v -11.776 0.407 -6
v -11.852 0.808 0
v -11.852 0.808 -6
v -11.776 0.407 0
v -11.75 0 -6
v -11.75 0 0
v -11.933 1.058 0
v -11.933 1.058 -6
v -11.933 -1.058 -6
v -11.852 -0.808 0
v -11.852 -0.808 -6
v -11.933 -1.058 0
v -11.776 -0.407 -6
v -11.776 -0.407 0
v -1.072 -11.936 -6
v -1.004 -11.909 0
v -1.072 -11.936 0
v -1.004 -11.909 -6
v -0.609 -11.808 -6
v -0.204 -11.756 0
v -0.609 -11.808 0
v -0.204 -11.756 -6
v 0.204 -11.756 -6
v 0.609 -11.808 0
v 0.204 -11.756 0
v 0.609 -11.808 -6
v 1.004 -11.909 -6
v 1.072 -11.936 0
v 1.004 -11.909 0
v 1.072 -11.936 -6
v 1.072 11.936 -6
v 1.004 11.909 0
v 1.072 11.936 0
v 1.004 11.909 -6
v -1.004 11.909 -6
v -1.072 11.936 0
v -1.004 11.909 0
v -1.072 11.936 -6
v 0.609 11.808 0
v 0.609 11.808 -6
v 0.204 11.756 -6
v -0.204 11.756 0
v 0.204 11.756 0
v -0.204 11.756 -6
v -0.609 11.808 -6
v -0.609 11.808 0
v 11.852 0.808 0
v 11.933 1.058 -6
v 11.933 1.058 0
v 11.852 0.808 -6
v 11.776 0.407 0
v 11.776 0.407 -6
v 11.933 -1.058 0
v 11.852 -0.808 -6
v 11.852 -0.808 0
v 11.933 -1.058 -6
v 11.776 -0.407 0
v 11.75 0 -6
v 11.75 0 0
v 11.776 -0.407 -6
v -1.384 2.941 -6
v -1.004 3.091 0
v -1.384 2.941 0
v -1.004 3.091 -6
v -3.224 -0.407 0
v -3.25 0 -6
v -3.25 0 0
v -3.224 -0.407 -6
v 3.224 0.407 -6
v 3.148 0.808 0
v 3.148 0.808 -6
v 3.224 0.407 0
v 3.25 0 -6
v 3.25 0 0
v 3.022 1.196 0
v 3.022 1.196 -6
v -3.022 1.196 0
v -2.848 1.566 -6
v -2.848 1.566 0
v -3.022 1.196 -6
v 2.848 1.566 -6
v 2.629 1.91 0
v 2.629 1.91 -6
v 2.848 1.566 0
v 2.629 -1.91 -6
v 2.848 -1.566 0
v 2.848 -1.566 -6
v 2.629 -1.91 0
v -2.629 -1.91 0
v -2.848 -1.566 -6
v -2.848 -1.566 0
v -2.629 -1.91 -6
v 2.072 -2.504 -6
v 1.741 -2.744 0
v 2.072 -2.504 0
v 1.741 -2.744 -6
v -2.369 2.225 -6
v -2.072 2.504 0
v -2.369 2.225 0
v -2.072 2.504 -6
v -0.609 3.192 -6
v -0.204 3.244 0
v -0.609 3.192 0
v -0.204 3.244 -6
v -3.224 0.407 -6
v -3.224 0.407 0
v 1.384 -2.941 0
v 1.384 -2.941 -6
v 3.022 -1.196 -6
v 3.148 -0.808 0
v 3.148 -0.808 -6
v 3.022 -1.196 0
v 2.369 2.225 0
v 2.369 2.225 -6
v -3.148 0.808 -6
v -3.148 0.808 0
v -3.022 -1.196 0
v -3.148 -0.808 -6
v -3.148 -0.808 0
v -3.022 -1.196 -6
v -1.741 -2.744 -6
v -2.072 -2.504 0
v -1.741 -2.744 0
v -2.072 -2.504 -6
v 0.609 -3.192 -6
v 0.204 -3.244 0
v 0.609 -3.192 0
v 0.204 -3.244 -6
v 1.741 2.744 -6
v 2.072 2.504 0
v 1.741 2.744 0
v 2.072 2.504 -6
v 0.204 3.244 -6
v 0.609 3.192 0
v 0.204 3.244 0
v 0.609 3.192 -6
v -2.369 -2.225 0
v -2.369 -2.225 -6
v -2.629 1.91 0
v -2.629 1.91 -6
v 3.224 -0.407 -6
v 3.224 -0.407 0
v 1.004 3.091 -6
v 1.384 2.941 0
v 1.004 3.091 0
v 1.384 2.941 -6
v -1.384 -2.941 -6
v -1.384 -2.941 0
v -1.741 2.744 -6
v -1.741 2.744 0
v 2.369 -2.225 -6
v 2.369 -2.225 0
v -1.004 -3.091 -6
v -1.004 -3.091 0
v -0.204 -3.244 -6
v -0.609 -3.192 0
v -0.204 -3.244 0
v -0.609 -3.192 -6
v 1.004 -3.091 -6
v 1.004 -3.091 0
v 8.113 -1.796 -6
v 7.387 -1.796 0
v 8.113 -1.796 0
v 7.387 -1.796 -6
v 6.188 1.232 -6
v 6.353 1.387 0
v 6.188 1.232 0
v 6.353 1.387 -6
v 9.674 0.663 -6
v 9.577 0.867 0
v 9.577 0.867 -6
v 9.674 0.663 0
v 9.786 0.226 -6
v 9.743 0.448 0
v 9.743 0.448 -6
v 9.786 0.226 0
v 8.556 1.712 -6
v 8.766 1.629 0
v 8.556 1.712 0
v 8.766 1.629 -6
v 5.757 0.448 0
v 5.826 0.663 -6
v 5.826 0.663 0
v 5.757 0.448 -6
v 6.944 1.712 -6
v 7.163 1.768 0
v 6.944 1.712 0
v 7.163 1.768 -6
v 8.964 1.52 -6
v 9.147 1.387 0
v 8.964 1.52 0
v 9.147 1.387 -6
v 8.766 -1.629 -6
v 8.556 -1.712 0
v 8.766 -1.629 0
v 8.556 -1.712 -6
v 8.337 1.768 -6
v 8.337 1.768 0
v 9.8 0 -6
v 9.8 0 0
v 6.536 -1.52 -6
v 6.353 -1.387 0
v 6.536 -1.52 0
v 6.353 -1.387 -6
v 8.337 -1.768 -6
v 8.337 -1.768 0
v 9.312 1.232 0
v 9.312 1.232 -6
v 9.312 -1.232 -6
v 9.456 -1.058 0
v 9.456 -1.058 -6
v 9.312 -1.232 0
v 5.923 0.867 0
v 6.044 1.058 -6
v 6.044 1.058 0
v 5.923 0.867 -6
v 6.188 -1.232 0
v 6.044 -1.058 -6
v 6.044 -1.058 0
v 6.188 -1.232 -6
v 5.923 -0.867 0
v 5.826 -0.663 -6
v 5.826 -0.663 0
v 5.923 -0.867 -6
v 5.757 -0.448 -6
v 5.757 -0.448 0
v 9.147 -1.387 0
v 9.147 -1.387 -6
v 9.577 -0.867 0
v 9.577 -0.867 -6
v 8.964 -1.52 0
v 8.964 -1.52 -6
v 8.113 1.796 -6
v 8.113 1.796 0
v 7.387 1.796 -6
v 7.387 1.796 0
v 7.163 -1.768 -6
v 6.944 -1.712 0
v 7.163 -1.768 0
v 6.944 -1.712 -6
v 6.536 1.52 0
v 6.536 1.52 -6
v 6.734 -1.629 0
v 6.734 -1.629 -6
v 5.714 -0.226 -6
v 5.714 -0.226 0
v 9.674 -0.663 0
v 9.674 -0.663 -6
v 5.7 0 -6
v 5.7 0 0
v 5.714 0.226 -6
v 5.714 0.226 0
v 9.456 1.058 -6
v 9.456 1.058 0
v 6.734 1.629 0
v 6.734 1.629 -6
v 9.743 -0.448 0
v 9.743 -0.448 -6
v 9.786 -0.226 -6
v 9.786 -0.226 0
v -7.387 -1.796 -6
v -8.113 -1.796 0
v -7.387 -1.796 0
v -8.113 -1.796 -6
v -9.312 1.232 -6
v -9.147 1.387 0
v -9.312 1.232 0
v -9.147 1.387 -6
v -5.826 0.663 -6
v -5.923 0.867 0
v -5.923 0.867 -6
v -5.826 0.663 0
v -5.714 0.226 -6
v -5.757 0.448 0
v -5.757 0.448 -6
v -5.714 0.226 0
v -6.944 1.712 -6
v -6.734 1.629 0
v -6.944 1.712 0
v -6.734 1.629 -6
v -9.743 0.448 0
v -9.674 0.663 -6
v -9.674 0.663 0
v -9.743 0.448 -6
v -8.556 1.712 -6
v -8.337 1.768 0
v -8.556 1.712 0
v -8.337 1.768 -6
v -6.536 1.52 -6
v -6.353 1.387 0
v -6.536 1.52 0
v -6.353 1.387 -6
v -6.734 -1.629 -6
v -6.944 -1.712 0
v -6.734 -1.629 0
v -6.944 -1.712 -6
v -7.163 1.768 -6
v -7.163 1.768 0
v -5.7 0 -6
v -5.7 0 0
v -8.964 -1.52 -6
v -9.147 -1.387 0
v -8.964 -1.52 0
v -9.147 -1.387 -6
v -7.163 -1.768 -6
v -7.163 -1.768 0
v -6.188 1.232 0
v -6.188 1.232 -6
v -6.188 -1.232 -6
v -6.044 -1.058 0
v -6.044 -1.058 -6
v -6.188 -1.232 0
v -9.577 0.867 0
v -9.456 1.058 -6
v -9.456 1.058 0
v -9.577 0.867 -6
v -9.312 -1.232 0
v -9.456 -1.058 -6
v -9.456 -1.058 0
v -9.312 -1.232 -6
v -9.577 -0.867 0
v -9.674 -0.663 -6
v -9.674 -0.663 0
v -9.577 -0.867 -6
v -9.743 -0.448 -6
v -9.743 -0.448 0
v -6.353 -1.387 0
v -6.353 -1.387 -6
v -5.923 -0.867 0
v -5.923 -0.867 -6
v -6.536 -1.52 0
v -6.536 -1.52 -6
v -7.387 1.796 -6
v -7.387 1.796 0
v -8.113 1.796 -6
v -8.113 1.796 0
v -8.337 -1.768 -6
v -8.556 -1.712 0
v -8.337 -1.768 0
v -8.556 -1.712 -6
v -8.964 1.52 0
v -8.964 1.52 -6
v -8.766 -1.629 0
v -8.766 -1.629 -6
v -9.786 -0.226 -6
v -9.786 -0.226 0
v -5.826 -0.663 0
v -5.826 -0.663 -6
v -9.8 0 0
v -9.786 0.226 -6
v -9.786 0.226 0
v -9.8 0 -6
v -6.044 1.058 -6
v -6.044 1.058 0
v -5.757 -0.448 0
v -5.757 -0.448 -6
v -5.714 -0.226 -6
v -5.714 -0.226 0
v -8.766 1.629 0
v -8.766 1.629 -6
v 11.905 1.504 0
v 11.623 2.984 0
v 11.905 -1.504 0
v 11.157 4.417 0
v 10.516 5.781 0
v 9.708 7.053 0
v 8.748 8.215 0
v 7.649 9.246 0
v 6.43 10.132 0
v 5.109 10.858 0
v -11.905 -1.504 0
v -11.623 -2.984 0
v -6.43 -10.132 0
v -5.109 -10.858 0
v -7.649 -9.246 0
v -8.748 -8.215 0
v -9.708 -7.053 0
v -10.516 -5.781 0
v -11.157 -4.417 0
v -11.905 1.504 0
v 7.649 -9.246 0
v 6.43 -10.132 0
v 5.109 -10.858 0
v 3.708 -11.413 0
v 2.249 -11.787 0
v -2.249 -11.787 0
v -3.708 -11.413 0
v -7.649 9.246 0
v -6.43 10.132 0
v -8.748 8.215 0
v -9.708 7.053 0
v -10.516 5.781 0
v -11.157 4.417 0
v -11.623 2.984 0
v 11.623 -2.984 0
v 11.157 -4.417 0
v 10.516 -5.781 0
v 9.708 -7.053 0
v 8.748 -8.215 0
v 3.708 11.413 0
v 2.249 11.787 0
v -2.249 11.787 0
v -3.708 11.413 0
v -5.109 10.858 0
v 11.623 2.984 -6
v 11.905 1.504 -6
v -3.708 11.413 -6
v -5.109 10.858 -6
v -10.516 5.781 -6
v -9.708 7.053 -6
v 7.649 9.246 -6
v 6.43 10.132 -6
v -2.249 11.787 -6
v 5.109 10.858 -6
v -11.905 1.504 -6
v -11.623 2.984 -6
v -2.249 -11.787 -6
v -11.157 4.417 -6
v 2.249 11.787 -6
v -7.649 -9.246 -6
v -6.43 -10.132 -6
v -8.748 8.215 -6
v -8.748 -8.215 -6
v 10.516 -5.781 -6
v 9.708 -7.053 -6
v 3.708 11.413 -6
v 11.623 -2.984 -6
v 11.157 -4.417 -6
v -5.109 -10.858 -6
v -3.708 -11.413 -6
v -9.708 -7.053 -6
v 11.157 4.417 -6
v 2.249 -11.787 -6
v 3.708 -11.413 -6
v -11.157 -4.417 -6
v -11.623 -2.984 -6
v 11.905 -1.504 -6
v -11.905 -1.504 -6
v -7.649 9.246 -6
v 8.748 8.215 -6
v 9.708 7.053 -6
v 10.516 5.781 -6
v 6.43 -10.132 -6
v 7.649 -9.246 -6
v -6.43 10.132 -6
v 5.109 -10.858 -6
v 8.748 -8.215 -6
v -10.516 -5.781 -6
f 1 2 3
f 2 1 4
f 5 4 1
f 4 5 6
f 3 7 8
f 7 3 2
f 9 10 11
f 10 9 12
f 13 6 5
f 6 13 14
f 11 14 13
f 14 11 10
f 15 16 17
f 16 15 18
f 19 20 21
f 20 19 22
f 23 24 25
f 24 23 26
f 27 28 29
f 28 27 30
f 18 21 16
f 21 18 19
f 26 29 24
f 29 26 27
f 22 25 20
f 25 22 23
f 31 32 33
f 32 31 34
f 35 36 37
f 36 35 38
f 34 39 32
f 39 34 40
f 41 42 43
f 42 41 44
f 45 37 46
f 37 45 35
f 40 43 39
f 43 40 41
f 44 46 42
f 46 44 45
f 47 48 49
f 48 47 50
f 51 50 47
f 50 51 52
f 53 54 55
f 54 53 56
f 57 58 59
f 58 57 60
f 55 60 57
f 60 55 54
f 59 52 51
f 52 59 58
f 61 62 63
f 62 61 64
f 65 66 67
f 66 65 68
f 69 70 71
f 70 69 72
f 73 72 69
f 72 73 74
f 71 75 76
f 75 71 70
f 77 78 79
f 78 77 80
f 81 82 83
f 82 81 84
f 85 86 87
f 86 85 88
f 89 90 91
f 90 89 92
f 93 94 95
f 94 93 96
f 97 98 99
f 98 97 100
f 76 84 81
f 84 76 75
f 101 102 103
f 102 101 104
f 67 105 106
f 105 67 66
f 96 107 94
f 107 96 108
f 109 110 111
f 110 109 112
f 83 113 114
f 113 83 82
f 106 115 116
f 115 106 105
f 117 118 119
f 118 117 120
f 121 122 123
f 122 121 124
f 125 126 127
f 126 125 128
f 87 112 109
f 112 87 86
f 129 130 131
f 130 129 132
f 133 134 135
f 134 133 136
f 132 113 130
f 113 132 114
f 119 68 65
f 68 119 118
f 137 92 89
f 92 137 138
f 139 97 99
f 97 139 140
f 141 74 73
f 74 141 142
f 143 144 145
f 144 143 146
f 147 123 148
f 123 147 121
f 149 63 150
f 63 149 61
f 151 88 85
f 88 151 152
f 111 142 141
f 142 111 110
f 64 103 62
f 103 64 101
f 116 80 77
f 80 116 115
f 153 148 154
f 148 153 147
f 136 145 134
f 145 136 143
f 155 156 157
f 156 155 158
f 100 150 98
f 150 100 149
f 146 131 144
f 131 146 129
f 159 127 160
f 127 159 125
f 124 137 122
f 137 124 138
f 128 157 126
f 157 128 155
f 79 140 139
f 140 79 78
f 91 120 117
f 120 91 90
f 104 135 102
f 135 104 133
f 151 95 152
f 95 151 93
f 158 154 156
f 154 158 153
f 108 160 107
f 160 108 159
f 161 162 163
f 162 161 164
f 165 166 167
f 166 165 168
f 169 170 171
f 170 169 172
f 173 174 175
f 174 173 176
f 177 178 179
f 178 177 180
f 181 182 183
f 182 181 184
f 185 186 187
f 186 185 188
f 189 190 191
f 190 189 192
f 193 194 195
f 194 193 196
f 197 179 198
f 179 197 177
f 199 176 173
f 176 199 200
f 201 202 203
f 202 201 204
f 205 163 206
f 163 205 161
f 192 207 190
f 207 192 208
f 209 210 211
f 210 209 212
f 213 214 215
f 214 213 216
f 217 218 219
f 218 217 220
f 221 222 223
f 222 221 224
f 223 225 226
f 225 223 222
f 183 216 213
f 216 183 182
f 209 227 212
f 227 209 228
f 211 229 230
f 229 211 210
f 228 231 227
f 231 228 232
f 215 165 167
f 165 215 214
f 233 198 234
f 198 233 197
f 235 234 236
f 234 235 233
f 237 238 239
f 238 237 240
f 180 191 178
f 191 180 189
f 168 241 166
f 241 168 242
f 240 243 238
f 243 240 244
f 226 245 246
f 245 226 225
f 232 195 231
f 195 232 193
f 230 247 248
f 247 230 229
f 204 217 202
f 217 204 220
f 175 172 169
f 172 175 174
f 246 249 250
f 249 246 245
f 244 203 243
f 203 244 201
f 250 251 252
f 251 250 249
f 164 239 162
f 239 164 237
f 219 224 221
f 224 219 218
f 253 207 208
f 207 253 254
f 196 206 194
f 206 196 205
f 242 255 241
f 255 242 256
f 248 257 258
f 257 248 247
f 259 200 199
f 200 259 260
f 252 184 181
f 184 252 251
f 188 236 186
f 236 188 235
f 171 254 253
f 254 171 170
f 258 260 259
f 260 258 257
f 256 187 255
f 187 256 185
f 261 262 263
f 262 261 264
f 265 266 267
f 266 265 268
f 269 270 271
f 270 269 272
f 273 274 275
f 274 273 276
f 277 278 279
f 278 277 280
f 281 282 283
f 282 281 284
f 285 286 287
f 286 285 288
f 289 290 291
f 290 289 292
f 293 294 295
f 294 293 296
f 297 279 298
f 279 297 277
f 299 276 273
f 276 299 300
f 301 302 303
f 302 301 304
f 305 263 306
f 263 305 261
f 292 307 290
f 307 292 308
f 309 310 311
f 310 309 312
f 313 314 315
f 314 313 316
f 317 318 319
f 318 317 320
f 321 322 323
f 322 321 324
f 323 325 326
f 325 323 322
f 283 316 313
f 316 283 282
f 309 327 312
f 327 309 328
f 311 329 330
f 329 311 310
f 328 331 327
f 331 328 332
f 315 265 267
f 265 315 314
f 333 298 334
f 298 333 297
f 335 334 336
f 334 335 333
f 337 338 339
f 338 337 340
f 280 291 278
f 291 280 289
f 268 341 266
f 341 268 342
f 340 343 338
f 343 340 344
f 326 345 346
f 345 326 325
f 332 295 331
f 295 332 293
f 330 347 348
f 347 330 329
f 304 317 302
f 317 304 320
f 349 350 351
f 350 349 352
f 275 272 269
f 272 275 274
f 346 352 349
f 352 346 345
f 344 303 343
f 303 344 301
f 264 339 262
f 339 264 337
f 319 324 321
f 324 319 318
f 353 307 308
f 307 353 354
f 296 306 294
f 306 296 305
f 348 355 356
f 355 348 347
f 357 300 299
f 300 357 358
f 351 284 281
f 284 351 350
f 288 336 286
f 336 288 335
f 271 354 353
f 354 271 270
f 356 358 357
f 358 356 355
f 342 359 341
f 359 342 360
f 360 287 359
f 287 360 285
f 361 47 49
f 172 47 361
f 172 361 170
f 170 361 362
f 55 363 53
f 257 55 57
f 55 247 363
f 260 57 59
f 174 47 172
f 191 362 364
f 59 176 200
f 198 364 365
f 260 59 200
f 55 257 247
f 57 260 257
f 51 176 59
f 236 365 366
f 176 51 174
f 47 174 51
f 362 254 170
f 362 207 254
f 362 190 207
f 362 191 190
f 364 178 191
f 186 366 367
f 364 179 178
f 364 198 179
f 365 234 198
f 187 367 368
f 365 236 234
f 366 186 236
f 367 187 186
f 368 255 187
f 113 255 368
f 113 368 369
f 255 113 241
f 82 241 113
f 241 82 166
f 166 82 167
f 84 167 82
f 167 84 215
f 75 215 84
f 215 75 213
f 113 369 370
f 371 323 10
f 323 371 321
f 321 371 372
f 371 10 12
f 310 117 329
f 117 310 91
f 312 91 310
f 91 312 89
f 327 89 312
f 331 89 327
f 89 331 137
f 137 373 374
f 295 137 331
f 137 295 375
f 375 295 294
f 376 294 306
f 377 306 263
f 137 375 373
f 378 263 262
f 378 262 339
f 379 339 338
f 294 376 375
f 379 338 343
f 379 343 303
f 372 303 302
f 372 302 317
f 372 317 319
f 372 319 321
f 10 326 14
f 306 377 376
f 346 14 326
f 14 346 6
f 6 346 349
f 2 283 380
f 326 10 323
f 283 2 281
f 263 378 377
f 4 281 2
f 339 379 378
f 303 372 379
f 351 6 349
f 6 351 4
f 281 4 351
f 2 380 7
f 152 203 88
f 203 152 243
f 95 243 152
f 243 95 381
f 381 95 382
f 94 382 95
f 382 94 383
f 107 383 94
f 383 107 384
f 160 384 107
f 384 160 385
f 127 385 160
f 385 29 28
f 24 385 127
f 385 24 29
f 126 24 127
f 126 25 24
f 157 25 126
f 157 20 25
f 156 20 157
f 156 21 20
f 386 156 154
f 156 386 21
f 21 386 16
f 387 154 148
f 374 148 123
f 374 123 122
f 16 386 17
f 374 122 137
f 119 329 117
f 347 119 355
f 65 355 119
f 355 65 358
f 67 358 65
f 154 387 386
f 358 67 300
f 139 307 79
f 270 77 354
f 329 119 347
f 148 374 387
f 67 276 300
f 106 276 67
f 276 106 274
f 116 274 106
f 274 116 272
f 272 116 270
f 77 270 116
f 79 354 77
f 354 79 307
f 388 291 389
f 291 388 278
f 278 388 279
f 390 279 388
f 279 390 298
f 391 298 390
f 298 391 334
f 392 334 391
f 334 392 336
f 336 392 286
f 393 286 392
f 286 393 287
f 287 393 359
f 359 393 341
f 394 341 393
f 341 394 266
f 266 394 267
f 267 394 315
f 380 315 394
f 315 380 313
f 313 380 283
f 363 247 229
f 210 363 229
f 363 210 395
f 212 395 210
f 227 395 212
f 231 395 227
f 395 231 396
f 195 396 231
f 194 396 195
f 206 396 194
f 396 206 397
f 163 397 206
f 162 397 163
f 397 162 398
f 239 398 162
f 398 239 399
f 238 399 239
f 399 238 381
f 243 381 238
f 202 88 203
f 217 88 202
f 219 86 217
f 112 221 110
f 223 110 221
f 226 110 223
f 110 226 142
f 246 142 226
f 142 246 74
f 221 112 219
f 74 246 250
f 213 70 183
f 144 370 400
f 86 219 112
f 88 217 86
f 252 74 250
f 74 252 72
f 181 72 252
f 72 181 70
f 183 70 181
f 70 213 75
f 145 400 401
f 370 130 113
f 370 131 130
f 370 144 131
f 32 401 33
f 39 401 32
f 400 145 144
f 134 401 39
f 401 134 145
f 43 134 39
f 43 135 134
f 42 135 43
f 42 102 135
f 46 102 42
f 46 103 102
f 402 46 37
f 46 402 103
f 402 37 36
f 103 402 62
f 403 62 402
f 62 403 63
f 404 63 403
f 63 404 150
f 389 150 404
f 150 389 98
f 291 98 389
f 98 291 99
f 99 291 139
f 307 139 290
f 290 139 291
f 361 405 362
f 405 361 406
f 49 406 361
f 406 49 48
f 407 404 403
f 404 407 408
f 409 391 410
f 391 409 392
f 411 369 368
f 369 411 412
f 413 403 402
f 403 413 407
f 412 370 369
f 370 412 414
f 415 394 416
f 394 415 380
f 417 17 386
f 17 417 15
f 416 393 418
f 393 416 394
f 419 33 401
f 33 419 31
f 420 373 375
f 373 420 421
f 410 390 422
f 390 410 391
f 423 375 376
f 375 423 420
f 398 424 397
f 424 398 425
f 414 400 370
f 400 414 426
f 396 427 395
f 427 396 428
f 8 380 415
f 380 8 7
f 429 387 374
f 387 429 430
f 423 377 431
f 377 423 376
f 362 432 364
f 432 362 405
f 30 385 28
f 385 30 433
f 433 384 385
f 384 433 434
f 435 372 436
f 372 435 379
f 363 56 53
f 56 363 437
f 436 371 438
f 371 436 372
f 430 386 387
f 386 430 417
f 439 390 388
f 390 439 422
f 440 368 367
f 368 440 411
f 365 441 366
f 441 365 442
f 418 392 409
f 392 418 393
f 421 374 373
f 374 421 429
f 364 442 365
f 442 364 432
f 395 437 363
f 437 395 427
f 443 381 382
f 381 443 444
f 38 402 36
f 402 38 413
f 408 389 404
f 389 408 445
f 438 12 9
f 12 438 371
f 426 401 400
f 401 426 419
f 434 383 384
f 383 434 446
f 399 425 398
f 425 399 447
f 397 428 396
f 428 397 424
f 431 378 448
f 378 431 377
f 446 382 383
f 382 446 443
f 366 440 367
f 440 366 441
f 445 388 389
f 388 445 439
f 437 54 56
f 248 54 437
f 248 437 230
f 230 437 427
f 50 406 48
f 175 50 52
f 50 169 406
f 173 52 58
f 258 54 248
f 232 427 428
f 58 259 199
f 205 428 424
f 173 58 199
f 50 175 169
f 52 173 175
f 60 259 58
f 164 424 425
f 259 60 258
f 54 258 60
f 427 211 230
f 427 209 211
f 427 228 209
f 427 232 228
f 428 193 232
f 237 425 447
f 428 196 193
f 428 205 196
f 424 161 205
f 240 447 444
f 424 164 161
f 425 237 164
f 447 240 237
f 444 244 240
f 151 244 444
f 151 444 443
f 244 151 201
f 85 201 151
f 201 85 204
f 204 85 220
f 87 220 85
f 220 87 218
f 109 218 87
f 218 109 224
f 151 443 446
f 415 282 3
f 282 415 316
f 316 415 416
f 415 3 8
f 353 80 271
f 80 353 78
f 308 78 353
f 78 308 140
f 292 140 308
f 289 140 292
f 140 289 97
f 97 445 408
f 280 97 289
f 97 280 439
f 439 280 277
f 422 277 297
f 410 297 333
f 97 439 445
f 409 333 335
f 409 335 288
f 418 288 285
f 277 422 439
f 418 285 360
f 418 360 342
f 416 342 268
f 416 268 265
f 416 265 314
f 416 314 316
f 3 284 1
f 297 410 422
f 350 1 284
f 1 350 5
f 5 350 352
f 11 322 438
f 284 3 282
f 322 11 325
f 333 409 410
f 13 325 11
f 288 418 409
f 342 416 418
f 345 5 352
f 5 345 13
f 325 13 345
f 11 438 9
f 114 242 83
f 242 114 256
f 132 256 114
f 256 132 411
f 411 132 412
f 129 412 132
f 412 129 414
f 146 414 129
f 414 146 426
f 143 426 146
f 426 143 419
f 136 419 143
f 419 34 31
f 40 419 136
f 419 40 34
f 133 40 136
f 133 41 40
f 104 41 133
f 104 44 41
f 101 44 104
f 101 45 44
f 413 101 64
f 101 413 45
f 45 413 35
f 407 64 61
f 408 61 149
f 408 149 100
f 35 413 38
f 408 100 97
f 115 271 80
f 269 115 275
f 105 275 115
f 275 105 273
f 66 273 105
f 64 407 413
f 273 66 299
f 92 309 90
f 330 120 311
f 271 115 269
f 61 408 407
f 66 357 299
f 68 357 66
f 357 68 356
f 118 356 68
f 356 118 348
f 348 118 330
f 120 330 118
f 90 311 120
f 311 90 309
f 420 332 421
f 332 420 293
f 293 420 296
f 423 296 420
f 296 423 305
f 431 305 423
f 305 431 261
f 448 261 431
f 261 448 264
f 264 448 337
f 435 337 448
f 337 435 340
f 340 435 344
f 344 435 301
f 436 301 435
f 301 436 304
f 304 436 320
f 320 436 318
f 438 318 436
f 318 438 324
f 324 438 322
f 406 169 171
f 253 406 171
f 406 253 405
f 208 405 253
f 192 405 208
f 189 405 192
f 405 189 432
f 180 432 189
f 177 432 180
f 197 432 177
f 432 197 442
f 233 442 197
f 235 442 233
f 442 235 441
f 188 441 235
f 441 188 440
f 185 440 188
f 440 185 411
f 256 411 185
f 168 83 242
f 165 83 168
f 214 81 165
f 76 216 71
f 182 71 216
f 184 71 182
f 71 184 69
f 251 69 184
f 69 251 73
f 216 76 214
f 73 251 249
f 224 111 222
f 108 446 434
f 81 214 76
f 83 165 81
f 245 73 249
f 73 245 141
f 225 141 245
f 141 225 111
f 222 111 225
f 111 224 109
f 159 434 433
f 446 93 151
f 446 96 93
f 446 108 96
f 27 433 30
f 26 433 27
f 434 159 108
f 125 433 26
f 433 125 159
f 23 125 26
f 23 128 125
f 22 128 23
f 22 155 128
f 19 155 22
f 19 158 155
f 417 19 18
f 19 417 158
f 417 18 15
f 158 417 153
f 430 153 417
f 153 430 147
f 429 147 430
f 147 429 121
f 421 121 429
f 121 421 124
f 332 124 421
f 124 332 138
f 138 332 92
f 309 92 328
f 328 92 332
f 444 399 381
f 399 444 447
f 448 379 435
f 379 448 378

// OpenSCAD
$fn = 50;


difference() {
	union() {
		translate(v = [0, 0, -6.0000000000]) {
			rotate(a = [0, 0, 0]) {
				cylinder(h = 12, r = 12.0000000000);
			}
		}
	}
	union() {
		translate(v = [0, 0, 0]) {
			rotate(a = [0, 0, 0]) {
				translate(v = [0, 0, -3.5000000000]) {
					union() {
						difference() {
							translate(v = [0, 0, 0]) {
								rotate(a = [0, 0, 0]) {
									cylinder(h = 7, r = 26.2000000000);
								}
							}
							translate(v = [0, 0, 0]) {
								rotate(a = [0, 0, 0]) {
									cylinder(h = 7, r = 20.0000000000);
								}
							}
						}
						difference() {
							translate(v = [0, 0, -50]) {
								rotate(a = [0, 0, 0]) {
									cylinder(h = 100, r = 23.6000000000);
								}
							}
							translate(v = [0, 0, -50]) {
								rotate(a = [0, 0, 0]) {
									cylinder(h = 100, r = 22.6000000000);
								}
							}
						}
					}
				}
			}
		}
		translate(v = [-30.0000000000, -30.0000000000, -125.0000000000]) {
			rotate(a = [0, 0, 0]) {
				cylinder(h = 250, r = 3.2500000000);
			}
		}
		translate(v = [-30.0000000000, -15.0000000000, -125.0000000000]) {
			rotate(a = [0, 0, 0]) {
				cylinder(h = 250, r = 3.2500000000);
			}
		}
		translate(v = [-30.0000000000, 15.0000000000, -125.0000000000]) {
			rotate(a = [0, 0, 0]) {
				cylinder(h = 250, r = 3.2500000000);
			}
		}
		translate(v = [-30.0000000000, 30.0000000000, -125.0000000000]) {
			rotate(a = [0, 0, 0]) {
				cylinder(h = 250, r = 3.2500000000);
			}
		}
		translate(v = [-15.0000000000, -30.0000000000, -125.0000000000]) {
			rotate(a = [0, 0, 0]) {
				cylinder(h = 250, r = 3.2500000000);
			}
		}
		translate(v = [-15.0000000000, 30.0000000000, -125.0000000000]) {
			rotate(a = [0, 0, 0]) {
				cylinder(h = 250, r = 3.2500000000);
			}
		}
		translate(v = [15.0000000000, -30.0000000000, -125.0000000000]) {
			rotate(a = [0, 0, 0]) {
				cylinder(h = 250, r = 3.2500000000);
			}
		}
		translate(v = [15.0000000000, 30.0000000000, -125.0000000000]) {
			rotate(a = [0, 0, 0]) {
				cylinder(h = 250, r = 3.2500000000);
			}
		}
		translate(v = [30.0000000000, -30.0000000000, -125.0000000000]) {
			rotate(a = [0, 0, 0]) {
				cylinder(h = 250, r = 3.2500000000);
			}
		}
		translate(v = [30.0000000000, -15.0000000000, -125.0000000000]) {
			rotate(a = [0, 0, 0]) {
				cylinder(h = 250, r = 3.2500000000);
			}
		}
		translate(v = [30.0000000000, 15.0000000000, -125.0000000000]) {
			rotate(a = [0, 0, 0]) {
				cylinder(h = 250, r = 3.2500000000);
			}
		}
		translate(v = [30.0000000000, 30.0000000000, -125.0000000000]) {
			rotate(a = [0, 0, 0]) {
				cylinder(h = 250, r = 3.2500000000);
			}
		}
		translate(v = [-15.0000000000, 0.0000000000, -125.0000000000]) {
			rotate(a = [0, 0, 0]) {
				cylinder(h = 250, r = 3.2500000000);
			}
		}
		translate(v = [0.0000000000, -15.0000000000, -125.0000000000]) {
			rotate(a = [0, 0, 0]) {
				cylinder(h = 250, r = 3.2500000000);
			}
		}
		translate(v = [0.0000000000, 15.0000000000, -125.0000000000]) {
			rotate(a = [0, 0, 0]) {
				cylinder(h = 250, r = 3.2500000000);
			}
		}
		translate(v = [15.0000000000, 0.0000000000, -125.0000000000]) {
			rotate(a = [0, 0, 0]) {
				cylinder(h = 250, r = 3.2500000000);
			}
		}
		translate(v = [0, 0, -125.0000000000]) {
			rotate(a = [0, 0, 0]) {
				cylinder(h = 250, r = 3.2500000000);
			}
		}
		translate(v = [30.0000000000, 0.0000000000, 4.1000000000]) {
			rotate(a = [0, 0, 15.0000000000]) {
				cylinder(h = 1.9000000000, r1 = 1.8000000000, r2 = 3.6000000000);
			}
		}
		translate(v = [30.0000000000, 0.0000000000, -6.0000000000]) {
			rotate(a = [0, 0, 15.0000000000]) {
				cylinder(h = 12, r = 1.8000000000);
			}
		}
		translate(v = [30.0000000000, 0.0000000000, -6.0000000000]) {
			rotate(a = [0, 0, 15.0000000000]) {
				translate(v = [0, 0, 0]) {
					rotate(a = [0, 0, 15.0000000000]) {
						linear_extrude(height = 3) {
							polygon(points = [[3.4620000000, 0.0000000000], [1.7310000000, 2.9981799479], [-1.7310000000, 2.9981799479], [-3.4620000000, 0.0000000000], [-1.7310000000, -2.9981799479], [1.7310000000, -2.9981799479]]);
						}
					}
				}
			}
		}
		translate(v = [28.2500000000, -3.2500000000, -3.0000000000]) {
			rotate(a = [0, 0, 0]) {
				cube(size = [3.5000000000, 6.5000000000, 0.3000000000]);
			}
		}
		translate(v = [28.2500000000, -1.7500000000, -2.7000000000]) {
			rotate(a = [0, 0, 0]) {
				cube(size = [3.5000000000, 3.5000000000, 0.3000000000]);
			}
		}
		translate(v = [28.2500000000, -3.2500000000, -6.3000000000]) {
			rotate(a = [0, 0, 0]) {
				cube(size = [3.5000000000, 6.5000000000, 0.3000000000]);
			}
		}
		translate(v = [28.2500000000, -1.7500000000, -6.6000000000]) {
			rotate(a = [0, 0, 0]) {
				cube(size = [3.5000000000, 3.5000000000, 0.3000000000]);
			}
		}
		translate(v = [0.0000000000, -30.0000000000, -4.1000000000]) {
			rotate(a = [0, 180, 0]) {
				cylinder(h = 1.9000000000, r1 = 1.8000000000, r2 = 3.6000000000);
			}
		}
		translate(v = [0.0000000000, -30.0000000000, 6.0000000000]) {
			rotate(a = [0, 180, 0]) {
				cylinder(h = 12, r = 1.8000000000);
			}
		}
		translate(v = [0.0000000000, -30.0000000000, 3.0000000000]) {
			rotate(a = [0, 180, 0]) {
				translate(v = [0, 0, 0]) {
					rotate(a = [0, 180, 0]) {
						linear_extrude(height = 3) {
							polygon(points = [[3.4620000000, 0.0000000000], [1.7310000000, 2.9981799479], [-1.7310000000, 2.9981799479], [-3.4620000000, 0.0000000000], [-1.7310000000, -2.9981799479], [1.7310000000, -2.9981799479]]);
						}
					}
				}
			}
		}
		translate(v = [-1.7500000000, -33.2500000000, 6.0000000000]) {
			rotate(a = [0, 0, 0]) {
				cube(size = [3.5000000000, 6.5000000000, 0.3000000000]);
			}
		}
		translate(v = [-1.7500000000, -31.7500000000, 6.3000000000]) {
			rotate(a = [0, 0, 0]) {
				cube(size = [3.5000000000, 3.5000000000, 0.3000000000]);
			}
		}
		translate(v = [-1.7500000000, -33.2500000000, 2.7000000000]) {
			rotate(a = [0, 0, 0]) {
				cube(size = [3.5000000000, 6.5000000000, 0.3000000000]);
			}
		}
		translate(v = [-1.7500000000, -31.7500000000, 2.4000000000]) {
			rotate(a = [0, 0, 0]) {
				cube(size = [3.5000000000, 3.5000000000, 0.3000000000]);
			}
		}
		translate(v = [-30.0000000000, 0.0000000000, 4.1000000000]) {
			rotate(a = [0, 0, 15.0000000000]) {
				cylinder(h = 1.9000000000, r1 = 1.8000000000, r2 = 3.6000000000);
			}
		}
		translate(v = [-30.0000000000, 0.0000000000, -6.0000000000]) {
			rotate(a = [0, 0, 15.0000000000]) {
				cylinder(h = 12, r = 1.8000000000);
			}
		}
		translate(v = [-30.0000000000, 0.0000000000, -6.0000000000]) {
			rotate(a = [0, 0, 15.0000000000]) {
				translate(v = [0, 0, 0]) {
					rotate(a = [0, 0, 15.0000000000]) {
						linear_extrude(height = 3) {
							polygon(points = [[3.4620000000, 0.0000000000], [1.7310000000, 2.9981799479], [-1.7310000000, 2.9981799479], [-3.4620000000, 0.0000000000], [-1.7310000000, -2.9981799479], [1.7310000000, -2.9981799479]]);
						}
					}
				}
			}
		}
		translate(v = [-31.7500000000, -3.2500000000, -3.0000000000]) {
			rotate(a = [0, 0, 0]) {
				cube(size = [3.5000000000, 6.5000000000, 0.3000000000]);
			}
		}
		translate(v = [-31.7500000000, -1.7500000000, -2.7000000000]) {
			rotate(a = [0, 0, 0]) {
				cube(size = [3.5000000000, 3.5000000000, 0.3000000000]);
			}
		}
		translate(v = [-31.7500000000, -3.2500000000, -6.3000000000]) {
			rotate(a = [0, 0, 0]) {
				cube(size = [3.5000000000, 6.5000000000, 0.3000000000]);
			}
		}
		translate(v = [-31.7500000000, -1.7500000000, -6.6000000000]) {
			rotate(a = [0, 0, 0]) {
				cube(size = [3.5000000000, 3.5000000000, 0.3000000000]);
			}
		}
		translate(v = [0.0000000000, 30.0000000000, -4.1000000000]) {
			rotate(a = [0, 180, 0]) {
				cylinder(h = 1.9000000000, r1 = 1.8000000000, r2 = 3.6000000000);
			}
		}
		translate(v = [0.0000000000, 30.0000000000, 6.0000000000]) {
			rotate(a = [0, 180, 0]) {
				cylinder(h = 12, r = 1.8000000000);
			}
		}
		translate(v = [0.0000000000, 30.0000000000, 3.0000000000]) {
			rotate(a = [0, 180, 0]) {
				translate(v = [0, 0, 0]) {
					rotate(a = [0, 180, 0]) {
						linear_extrude(height = 3) {
							polygon(points = [[3.4620000000, 0.0000000000], [1.7310000000, 2.9981799479], [-1.7310000000, 2.9981799479], [-3.4620000000, 0.0000000000], [-1.7310000000, -2.9981799479], [1.7310000000, -2.9981799479]]);
						}
					}
				}
			}
		}
		translate(v = [-1.7500000000, 26.7500000000, 6.0000000000]) {
			rotate(a = [0, 0, 0]) {
				cube(size = [3.5000000000, 6.5000000000, 0.3000000000]);
			}
		}
		translate(v = [-1.7500000000, 28.2500000000, 6.3000000000]) {
			rotate(a = [0, 0, 0]) {
				cube(size = [3.5000000000, 3.5000000000, 0.3000000000]);
			}
		}
		translate(v = [-1.7500000000, 26.7500000000, 2.7000000000]) {
			rotate(a = [0, 0, 0]) {
				cube(size = [3.5000000000, 6.5000000000, 0.3000000000]);
			}
		}
		translate(v = [-1.7500000000, 28.2500000000, 2.4000000000]) {
			rotate(a = [0, 0, 0]) {
				cube(size = [3.5000000000, 3.5000000000, 0.3000000000]);
			}
		}
		translate(v = [7.7500000000, 0, -125.0000000000]) {
			rotate(a = [0, 0, 0]) {
				hull() {
					translate(v = [0.2500000000, 0, 0]) {
						rotate(a = [0, 0, 0]) {
							translate(v = [0, 0, 0]) {
								rotate(a = [0, 0, 0]) {
									cylinder(h = 250, r = 1.8000000000);
								}
							}
						}
					}
					translate(v = [-0.2500000000, 0, 0]) {
						rotate(a = [0, 0, 0]) {
							translate(v = [0, 0, 0]) {
								rotate(a = [0, 0, 0]) {
									cylinder(h = 250, r = 1.8000000000);
								}
							}
						}
					}
				}
			}
		}
		translate(v = [-7.7500000000, 0, -125.0000000000]) {
			rotate(a = [0, 0, 0]) {
				hull() {
					translate(v = [0.2500000000, 0, 0]) {
						rotate(a = [0, 0, 0]) {
							translate(v = [0, 0, 0]) {
								rotate(a = [0, 0, 0]) {
									cylinder(h = 250, r = 1.8000000000);
								}
							}
						}
					}
					translate(v = [-0.2500000000, 0, 0]) {
						rotate(a = [0, 0, 0]) {
							translate(v = [0, 0, 0]) {
								rotate(a = [0, 0, 0]) {
									cylinder(h = 250, r = 1.8000000000);
								}
							}
						}
					}
				}
			}
		}
		translate(v = [-250.0000000000, -250.0000000000, 0]) {
			rotate(a = [0, 0, 0]) {
				cube(size = [500, 500, 500]);
			}
		}
	}
}
